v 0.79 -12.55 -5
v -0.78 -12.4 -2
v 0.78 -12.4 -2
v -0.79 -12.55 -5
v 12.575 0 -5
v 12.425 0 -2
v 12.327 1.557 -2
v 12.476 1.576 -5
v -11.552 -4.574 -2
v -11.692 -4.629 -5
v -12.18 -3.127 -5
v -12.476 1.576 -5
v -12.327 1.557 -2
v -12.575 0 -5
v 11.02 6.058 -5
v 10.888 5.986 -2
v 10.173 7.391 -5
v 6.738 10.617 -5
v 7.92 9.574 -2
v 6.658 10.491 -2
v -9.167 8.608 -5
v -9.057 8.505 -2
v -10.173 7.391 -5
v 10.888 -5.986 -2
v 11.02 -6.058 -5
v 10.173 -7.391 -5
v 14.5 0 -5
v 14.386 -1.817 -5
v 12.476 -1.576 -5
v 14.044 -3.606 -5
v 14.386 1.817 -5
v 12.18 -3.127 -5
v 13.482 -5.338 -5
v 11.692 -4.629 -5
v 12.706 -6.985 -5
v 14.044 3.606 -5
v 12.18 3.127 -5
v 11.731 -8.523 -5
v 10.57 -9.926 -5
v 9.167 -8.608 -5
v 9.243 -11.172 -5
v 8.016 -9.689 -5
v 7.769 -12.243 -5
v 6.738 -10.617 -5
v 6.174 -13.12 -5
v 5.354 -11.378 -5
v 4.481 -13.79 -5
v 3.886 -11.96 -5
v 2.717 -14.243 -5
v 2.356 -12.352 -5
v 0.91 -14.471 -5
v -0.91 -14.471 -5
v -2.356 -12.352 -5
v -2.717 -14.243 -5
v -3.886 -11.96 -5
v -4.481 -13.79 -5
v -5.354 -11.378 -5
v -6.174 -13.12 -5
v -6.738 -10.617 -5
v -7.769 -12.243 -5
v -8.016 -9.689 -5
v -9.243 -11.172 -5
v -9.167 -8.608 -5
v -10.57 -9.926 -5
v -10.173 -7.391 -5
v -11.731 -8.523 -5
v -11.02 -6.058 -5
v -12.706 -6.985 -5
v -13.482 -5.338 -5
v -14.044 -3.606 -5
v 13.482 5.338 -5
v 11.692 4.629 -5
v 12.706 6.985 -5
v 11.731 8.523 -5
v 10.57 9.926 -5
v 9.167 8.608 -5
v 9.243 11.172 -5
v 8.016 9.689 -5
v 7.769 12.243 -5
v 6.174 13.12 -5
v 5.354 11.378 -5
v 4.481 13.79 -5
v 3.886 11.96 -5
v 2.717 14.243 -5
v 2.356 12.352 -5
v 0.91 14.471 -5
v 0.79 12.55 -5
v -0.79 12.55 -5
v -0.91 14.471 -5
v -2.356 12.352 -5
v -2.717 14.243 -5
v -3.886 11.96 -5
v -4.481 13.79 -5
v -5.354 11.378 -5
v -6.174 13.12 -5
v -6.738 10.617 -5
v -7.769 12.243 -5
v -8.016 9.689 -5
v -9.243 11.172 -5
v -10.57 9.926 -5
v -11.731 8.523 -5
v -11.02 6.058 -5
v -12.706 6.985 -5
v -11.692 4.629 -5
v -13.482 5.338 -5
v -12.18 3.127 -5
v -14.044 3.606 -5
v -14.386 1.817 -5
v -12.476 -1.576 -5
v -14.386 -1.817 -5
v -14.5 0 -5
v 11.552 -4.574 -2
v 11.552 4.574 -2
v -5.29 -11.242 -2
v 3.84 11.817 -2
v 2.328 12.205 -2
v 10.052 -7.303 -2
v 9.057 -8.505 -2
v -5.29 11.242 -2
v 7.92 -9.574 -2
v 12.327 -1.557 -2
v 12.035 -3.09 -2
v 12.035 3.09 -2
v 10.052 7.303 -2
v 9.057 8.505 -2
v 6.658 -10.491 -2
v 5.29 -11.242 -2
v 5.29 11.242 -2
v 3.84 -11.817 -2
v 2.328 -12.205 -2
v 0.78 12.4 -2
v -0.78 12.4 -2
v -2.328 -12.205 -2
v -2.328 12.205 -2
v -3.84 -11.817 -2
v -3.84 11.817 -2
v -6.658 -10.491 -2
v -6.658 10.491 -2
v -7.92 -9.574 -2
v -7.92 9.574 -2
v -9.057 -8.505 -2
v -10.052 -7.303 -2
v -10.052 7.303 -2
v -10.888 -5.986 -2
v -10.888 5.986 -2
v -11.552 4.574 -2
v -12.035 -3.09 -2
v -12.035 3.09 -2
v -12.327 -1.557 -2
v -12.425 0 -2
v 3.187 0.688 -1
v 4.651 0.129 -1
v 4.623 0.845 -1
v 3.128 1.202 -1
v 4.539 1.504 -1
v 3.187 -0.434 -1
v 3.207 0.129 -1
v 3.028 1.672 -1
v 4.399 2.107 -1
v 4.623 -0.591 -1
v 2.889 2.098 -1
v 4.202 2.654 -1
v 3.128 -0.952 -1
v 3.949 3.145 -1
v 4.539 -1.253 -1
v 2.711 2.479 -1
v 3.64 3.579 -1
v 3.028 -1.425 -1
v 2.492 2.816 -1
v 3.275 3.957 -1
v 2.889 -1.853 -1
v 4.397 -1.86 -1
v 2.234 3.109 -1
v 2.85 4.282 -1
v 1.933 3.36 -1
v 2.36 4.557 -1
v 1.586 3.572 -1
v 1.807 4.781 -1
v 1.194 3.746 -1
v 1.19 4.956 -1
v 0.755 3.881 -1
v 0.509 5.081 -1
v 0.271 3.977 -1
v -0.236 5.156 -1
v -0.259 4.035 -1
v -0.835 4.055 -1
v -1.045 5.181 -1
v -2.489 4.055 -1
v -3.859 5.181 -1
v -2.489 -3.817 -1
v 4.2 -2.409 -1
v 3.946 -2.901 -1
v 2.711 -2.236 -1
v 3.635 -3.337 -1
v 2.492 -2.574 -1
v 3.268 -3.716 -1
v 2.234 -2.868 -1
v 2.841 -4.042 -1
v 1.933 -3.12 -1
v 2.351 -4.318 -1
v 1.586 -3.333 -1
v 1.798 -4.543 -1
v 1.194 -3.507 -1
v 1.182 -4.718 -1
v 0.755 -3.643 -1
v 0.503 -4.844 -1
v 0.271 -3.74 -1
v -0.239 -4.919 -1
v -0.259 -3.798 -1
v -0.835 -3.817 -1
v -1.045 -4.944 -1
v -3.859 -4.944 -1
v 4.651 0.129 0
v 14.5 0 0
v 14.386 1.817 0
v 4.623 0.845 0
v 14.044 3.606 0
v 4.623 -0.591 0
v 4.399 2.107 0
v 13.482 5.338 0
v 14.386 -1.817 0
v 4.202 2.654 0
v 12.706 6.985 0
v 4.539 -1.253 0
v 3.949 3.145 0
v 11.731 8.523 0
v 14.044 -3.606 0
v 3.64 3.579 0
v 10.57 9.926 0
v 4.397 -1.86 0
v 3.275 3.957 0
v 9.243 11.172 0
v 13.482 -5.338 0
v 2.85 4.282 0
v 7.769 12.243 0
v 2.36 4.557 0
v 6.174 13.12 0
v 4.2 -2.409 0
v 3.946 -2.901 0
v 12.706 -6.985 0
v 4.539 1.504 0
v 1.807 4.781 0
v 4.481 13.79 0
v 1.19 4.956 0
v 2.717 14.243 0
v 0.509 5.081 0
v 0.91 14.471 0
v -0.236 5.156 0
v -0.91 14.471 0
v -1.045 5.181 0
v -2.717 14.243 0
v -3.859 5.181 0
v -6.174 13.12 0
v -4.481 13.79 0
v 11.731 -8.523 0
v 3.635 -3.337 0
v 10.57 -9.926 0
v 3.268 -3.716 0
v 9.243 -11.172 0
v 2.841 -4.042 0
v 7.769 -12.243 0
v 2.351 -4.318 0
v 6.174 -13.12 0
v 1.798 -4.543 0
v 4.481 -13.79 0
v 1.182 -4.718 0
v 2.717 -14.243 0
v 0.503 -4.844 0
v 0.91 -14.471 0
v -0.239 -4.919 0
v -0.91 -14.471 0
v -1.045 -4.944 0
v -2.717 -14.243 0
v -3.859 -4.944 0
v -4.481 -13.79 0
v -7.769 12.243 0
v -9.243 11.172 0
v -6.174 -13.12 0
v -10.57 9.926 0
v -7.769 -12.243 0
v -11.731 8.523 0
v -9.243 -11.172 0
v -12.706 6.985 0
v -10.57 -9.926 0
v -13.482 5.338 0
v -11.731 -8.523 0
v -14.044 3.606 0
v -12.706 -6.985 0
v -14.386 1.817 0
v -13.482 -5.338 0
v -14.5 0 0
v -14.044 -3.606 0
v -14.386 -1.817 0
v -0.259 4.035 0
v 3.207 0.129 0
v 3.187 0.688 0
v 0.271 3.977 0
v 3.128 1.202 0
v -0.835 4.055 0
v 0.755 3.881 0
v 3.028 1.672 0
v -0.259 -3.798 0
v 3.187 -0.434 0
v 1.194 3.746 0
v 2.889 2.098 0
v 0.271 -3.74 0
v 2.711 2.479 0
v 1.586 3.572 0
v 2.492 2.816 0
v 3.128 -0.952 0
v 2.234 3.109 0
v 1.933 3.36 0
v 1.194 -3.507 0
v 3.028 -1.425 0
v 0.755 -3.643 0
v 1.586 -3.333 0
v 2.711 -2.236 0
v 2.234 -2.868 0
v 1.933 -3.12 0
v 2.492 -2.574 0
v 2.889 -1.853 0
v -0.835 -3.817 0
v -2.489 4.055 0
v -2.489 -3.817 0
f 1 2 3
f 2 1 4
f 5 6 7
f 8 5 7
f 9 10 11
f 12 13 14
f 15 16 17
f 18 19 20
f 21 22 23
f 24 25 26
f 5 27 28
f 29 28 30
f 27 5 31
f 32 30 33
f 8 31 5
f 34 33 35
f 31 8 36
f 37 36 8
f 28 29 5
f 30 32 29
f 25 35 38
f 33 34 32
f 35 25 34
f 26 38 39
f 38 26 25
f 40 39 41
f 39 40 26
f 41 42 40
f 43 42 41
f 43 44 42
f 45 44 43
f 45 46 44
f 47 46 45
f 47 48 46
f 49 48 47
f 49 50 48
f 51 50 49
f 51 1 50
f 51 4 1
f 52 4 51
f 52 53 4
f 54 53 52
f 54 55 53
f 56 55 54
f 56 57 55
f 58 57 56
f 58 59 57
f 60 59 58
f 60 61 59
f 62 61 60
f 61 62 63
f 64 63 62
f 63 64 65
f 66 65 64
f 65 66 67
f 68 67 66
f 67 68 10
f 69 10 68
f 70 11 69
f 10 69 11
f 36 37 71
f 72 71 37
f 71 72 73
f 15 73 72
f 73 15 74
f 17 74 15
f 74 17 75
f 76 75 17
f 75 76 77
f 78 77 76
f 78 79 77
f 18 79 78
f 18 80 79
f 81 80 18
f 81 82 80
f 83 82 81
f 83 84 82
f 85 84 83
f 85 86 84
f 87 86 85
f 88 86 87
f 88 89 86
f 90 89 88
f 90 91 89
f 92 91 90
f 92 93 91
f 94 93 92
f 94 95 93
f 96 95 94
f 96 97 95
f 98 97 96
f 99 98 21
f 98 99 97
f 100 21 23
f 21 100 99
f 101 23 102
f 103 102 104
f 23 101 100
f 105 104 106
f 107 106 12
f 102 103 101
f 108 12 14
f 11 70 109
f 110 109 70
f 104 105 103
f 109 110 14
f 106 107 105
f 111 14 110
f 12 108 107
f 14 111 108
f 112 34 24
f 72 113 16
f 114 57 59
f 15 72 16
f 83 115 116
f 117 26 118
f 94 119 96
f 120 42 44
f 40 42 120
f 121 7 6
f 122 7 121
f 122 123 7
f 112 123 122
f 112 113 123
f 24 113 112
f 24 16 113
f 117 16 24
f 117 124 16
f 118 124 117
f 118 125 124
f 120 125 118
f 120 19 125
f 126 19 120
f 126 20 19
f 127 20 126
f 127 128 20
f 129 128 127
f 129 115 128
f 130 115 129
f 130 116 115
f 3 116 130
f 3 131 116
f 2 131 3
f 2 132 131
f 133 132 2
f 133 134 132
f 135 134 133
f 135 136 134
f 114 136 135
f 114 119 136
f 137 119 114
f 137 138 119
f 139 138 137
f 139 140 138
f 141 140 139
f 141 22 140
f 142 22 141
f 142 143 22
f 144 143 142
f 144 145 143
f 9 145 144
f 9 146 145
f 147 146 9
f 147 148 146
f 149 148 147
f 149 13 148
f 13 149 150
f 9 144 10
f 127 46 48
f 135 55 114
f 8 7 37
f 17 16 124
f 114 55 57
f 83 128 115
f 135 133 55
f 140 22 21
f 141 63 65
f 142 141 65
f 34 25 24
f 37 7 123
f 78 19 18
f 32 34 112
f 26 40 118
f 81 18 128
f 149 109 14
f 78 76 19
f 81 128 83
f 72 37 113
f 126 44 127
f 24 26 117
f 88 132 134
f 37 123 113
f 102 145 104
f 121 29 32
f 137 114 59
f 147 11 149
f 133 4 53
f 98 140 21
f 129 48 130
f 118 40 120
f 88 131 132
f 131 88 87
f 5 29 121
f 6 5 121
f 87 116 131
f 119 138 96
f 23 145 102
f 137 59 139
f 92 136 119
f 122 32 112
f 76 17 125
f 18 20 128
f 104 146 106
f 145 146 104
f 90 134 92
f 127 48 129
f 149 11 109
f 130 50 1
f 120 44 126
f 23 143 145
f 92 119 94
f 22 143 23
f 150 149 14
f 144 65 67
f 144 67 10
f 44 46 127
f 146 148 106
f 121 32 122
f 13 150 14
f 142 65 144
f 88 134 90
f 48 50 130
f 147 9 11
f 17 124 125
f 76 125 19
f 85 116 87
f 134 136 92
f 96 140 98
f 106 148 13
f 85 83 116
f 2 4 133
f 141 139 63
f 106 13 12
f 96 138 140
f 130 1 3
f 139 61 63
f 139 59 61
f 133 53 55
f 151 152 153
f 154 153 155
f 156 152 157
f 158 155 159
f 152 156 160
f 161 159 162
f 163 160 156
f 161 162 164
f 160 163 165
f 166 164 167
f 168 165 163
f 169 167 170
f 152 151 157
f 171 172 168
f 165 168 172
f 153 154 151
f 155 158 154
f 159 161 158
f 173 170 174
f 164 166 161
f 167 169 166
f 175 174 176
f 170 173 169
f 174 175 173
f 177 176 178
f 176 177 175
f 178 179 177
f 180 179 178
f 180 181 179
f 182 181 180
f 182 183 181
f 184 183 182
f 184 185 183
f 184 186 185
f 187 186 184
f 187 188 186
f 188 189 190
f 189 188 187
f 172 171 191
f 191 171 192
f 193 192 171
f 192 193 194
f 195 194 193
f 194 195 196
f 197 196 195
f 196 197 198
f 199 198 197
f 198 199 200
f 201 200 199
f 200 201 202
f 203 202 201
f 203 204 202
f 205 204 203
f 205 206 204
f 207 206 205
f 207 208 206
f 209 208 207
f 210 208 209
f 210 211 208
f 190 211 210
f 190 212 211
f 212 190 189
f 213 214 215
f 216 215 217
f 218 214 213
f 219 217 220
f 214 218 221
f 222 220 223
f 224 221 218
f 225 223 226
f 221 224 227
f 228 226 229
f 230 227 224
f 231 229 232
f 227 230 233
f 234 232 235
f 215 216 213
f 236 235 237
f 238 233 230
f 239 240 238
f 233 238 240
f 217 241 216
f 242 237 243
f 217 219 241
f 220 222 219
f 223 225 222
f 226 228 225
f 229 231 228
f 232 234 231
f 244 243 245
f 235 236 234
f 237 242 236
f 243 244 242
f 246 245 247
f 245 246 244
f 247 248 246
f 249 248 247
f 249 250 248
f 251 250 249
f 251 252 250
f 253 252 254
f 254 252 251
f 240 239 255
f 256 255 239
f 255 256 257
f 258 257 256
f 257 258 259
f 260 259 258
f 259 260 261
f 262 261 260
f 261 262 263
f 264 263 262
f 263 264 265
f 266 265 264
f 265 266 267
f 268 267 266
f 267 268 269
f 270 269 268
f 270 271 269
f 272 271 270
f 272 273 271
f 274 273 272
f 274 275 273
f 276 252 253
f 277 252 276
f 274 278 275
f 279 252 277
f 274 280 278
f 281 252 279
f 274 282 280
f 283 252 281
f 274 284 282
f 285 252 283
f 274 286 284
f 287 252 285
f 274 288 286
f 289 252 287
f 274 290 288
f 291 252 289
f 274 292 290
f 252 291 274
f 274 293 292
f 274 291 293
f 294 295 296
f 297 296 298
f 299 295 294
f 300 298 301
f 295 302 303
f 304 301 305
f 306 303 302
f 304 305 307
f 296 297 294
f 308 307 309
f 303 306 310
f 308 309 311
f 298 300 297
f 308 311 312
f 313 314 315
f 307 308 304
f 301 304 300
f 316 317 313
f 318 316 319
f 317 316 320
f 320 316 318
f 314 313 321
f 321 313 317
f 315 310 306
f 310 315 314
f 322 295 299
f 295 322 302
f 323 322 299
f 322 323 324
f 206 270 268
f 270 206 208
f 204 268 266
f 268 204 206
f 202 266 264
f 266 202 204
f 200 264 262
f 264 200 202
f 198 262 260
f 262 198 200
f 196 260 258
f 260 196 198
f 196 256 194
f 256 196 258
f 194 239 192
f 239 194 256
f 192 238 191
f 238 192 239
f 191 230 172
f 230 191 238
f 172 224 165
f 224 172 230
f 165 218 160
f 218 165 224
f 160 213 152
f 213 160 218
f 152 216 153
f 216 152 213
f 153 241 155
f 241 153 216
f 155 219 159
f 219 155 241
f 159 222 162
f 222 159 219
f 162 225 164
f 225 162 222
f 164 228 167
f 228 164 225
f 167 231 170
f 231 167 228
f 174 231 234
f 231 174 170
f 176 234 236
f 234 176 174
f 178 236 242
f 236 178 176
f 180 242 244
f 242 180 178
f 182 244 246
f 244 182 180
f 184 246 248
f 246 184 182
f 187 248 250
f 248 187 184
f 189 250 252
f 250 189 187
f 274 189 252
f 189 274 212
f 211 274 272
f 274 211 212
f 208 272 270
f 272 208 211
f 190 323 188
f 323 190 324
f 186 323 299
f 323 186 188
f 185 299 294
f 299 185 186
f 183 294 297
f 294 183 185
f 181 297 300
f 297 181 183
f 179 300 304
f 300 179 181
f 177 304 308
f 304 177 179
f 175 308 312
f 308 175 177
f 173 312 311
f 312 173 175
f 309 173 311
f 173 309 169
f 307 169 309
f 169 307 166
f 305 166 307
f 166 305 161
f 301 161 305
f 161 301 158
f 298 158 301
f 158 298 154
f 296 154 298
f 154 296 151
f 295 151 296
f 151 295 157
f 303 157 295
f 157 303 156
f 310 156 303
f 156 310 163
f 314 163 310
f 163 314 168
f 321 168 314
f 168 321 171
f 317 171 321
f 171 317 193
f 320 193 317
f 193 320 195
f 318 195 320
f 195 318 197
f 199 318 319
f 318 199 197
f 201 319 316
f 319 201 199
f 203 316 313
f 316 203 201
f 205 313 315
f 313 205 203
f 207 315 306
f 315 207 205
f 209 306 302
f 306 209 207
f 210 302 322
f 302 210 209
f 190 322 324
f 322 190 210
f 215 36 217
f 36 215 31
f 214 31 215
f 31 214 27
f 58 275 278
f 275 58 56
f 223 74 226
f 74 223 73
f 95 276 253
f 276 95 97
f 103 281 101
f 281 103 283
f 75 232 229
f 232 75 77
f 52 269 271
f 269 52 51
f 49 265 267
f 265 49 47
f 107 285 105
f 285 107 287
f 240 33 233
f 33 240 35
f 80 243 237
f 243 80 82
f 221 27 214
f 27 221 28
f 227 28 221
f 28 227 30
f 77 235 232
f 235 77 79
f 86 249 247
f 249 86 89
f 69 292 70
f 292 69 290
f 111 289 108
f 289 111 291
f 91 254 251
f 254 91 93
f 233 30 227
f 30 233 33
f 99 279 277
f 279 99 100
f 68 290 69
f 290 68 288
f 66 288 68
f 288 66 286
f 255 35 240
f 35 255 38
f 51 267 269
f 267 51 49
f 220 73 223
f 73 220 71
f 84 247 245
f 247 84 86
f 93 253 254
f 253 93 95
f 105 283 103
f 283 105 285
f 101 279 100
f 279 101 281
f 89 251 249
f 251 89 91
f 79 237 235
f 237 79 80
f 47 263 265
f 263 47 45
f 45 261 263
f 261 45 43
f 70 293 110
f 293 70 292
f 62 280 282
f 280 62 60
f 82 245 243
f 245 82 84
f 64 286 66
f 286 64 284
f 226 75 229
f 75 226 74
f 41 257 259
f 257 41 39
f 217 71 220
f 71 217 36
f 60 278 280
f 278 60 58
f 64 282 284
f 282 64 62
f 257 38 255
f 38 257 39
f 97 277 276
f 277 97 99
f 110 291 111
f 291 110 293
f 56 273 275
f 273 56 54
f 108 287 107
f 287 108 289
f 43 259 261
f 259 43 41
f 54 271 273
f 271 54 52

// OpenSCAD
$fn = 50;

difference() {
	union() {
		translate(v = [0, 0, -5.0]) {
			cylinder(h = 5, r = 14.5);
		}
	}
	union() {
		#translate(v = [0, 0, -5.0]) {
			cylinder(h = 3, r1 = 12.575, r2 = 12.425);
		}
		translate(v = [0, 0, -1]) {
			linear_extrude(height = 1) {
				text(font = "Impact", halign = "center", size = 10, text = "D", valign = "center");
			}
		}
	}
}
